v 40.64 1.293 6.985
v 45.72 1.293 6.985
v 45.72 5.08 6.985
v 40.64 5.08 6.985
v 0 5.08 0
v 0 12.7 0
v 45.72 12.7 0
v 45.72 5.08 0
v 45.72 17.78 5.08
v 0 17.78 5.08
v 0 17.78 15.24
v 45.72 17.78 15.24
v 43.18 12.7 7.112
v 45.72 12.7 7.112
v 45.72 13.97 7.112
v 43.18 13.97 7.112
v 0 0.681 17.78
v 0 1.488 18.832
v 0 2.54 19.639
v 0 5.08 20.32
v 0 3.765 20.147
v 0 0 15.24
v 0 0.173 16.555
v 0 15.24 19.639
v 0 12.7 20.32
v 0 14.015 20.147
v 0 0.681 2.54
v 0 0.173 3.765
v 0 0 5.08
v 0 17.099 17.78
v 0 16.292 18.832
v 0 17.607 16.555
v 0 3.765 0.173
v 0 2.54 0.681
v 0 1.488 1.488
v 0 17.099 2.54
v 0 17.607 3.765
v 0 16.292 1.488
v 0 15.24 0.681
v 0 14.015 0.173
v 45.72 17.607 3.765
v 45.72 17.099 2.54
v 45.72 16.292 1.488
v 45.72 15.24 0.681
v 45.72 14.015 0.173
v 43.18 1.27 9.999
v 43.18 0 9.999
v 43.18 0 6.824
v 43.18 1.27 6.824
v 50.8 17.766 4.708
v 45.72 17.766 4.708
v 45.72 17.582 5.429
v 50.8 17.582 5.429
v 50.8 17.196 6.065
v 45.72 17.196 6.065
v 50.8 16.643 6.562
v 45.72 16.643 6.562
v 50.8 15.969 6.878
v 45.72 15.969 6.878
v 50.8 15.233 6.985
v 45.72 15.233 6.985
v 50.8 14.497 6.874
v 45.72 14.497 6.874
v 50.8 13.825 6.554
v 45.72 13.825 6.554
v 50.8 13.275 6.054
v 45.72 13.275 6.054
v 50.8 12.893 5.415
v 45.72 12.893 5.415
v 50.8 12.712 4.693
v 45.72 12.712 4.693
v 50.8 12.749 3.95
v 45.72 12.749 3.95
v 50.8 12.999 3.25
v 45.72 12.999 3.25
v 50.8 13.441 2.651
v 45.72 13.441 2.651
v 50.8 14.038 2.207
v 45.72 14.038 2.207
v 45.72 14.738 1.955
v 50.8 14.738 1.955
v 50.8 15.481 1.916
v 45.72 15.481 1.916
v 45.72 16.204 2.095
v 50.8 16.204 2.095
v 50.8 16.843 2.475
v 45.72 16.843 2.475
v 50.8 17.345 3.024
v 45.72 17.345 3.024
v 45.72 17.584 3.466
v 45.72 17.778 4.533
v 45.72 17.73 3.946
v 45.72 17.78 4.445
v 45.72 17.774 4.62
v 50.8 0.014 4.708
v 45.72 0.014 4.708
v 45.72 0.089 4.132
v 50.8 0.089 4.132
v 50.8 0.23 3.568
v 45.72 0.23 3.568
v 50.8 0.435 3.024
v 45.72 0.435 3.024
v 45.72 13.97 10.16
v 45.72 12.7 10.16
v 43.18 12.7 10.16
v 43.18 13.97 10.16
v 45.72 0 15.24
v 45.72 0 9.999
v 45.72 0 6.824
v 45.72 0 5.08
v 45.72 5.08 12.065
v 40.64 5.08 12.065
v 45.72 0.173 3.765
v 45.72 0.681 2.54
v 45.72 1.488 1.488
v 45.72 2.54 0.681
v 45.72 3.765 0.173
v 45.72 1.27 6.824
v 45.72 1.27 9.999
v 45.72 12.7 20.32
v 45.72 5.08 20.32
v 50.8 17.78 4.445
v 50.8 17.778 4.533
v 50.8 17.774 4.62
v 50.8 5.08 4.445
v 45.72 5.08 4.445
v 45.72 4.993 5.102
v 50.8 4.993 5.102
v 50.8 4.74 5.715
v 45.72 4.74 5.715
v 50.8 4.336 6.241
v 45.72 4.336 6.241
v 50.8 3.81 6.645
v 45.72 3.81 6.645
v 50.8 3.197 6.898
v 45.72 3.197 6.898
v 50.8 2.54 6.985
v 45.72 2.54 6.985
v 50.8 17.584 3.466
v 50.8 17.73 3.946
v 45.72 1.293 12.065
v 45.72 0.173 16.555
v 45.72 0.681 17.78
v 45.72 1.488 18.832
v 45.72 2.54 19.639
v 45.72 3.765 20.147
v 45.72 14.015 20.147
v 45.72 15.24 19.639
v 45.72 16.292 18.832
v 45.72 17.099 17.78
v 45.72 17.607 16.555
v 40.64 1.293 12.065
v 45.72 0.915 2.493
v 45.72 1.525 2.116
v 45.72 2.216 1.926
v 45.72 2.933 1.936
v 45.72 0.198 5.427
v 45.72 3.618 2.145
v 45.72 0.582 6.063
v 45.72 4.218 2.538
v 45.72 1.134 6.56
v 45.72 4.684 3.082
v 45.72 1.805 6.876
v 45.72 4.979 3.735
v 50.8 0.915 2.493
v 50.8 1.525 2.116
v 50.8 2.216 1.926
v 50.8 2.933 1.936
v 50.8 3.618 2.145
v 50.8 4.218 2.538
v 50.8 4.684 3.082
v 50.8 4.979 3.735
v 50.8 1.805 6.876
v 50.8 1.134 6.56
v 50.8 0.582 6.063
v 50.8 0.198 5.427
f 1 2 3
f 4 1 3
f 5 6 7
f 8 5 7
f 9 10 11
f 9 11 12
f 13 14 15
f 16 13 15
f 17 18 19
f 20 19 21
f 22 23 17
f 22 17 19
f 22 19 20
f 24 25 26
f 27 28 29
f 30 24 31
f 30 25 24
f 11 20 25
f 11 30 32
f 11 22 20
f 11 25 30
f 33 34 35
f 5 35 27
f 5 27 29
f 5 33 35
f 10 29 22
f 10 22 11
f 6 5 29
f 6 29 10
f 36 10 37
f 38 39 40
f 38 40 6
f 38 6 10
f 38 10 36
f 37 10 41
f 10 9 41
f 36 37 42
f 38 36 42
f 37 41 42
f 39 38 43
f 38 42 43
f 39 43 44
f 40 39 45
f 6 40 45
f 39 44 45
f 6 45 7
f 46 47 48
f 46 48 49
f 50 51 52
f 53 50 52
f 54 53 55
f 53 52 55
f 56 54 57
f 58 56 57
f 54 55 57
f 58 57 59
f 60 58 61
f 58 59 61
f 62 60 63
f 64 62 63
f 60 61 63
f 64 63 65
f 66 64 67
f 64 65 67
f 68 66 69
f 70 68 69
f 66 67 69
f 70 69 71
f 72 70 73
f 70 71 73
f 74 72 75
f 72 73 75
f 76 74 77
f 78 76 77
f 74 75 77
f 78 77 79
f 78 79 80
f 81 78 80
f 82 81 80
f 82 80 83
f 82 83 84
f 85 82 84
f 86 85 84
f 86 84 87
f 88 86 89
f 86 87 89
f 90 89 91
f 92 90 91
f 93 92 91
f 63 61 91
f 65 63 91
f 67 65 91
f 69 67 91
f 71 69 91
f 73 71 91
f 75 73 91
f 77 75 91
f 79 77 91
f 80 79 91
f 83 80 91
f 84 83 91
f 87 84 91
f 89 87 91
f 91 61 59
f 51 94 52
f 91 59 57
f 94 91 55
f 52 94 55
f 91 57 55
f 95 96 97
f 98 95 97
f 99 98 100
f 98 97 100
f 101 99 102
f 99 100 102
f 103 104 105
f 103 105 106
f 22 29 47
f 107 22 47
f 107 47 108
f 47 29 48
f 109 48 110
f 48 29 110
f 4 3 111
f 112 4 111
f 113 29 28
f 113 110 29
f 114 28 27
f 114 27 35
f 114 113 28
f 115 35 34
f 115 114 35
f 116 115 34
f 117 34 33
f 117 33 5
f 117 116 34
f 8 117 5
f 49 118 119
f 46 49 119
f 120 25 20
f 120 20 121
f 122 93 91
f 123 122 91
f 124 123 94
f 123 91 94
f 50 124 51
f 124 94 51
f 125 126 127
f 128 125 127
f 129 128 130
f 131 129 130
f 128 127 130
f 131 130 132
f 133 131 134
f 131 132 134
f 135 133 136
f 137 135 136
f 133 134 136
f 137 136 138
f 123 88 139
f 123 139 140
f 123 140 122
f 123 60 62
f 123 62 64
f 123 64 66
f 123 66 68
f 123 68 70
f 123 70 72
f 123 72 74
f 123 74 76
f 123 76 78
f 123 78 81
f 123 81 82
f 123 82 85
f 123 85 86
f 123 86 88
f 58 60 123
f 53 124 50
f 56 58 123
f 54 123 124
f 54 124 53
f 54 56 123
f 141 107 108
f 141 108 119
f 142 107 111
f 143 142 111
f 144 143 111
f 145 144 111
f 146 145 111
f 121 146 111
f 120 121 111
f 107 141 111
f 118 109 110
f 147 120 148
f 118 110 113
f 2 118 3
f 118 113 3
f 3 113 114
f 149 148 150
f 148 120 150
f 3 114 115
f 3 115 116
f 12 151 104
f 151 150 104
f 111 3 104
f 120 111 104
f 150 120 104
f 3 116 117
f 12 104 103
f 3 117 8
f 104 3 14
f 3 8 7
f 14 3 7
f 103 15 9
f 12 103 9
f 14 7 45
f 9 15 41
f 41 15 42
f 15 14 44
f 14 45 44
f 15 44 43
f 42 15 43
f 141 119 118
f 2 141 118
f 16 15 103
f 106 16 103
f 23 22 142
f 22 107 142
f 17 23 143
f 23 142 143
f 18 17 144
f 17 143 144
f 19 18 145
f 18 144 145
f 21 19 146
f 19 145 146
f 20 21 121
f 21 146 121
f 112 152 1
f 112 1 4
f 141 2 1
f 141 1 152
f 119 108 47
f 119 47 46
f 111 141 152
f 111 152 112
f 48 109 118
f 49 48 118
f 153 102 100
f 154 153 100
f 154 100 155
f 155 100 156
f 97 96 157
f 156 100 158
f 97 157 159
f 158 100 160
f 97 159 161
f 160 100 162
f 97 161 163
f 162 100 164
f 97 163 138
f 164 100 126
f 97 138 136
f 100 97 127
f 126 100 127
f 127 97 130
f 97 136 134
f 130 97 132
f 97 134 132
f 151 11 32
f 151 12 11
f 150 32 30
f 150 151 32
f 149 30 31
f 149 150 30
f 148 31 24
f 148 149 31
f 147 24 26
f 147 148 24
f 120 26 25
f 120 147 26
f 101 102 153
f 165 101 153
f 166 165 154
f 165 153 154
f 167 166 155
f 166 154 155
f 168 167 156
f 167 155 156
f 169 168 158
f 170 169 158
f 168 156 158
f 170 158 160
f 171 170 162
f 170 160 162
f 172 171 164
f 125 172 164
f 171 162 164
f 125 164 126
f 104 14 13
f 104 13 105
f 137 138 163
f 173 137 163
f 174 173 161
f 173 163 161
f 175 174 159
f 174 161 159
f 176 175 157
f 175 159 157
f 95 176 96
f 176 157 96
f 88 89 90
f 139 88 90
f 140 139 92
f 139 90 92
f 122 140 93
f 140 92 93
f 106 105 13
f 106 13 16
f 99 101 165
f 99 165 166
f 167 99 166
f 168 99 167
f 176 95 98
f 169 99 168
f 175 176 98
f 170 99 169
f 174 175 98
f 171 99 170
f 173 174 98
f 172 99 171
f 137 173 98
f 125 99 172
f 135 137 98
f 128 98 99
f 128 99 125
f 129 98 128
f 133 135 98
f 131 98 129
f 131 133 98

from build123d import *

# Parameters (mm, degrees)
F0_W      = 45.72
F0_H      = 17.78
F1_DEPTH  = 20.32
F2_R      = 5.08
F3_W      = 3.7871776995
F3_H      = 5.08
F3_W_2    = 3.7677848834
F4_DEPTH  = 5.08
F9_W      = 1.27
F9_H      = 3.175
F9_H_2    = 3.048
F10_DEPTH = 2.54
F12_DEPTH = 5.08


# Not quite as in the source:
# - the program builds the solid bodies; features that only make, move or delete a surface that nothing else refers to are left out


with BuildPart() as f1:
    # F0 (on Top) → F1 (new body)
    with BuildSketch(Plane.XY):
        with Locations((22.86, 8.89)):
            Rectangle(F0_W, F0_H)
    extrude(amount=F1_DEPTH)

    # F2
    f2_edges = [f1.edges().sort_by_distance(p)[0] for p in [
        (22.86, 17.78, 20.32),
        (22.86, 0, 20.32),
        (22.86, 17.78, 0),
        (22.86, 0, 0),
    ]]
    fillet(f2_edges, radius=F2_R)

    # F3 (on face) → F4 (cut)
    with BuildSketch(Plane.YZ.offset(45.72)):
        with Locations((3.1864111502, 9.525)):
            Rectangle(F3_W, F3_H)
        with Locations((22.2461075583, 9.525)):
            Rectangle(F3_W_2, F3_H)
    extrude(amount=-F4_DEPTH, mode=Mode.SUBTRACT)

    # F9 (on face) → F10 (cut)
    with BuildSketch(Plane.YZ.offset(45.72)):
        with Locations((0.635, 8.4111910738)):
            Rectangle(F9_W, F9_H)
        with Locations((13.335, 8.636)):
            Rectangle(F9_W, F9_H_2)
    extrude(amount=-F10_DEPTH, mode=Mode.SUBTRACT)


with BuildPart() as f12:
    # F11 (on face) → F12 (new body)
    with BuildSketch(Plane.YZ.offset(45.72)):
        with BuildLine():
            ThreePointArc((0.4345907815, 3.0241368741), (3.2829201118, 2.0160764303), (5.08, 4.445))
            ThreePointArc((5.08, 4.445), (4.3360512242, 6.2410512242), (2.54, 6.985))
            ThreePointArc((2.54, 6.985), (0.839444466, 6.3317196071), (0.0136445126, 4.7079219494))
            ThreePointArc((0.0136445126, 4.7079219494), (0.1516760993, 3.8479190248), (0.4345907815, 3.0241368741))
        make_face()
    extrude(amount=F12_DEPTH)


with BuildPart() as f12b:
    # F11 (on face) → F12, piece 2 (new body)
    with BuildSketch(Plane.YZ.offset(45.72)):
        with BuildLine():
            ThreePointArc((17.7663554874, 4.7079219494), (17.6283239007, 3.8479190248), (17.3454092185, 3.0241368741))
            ThreePointArc((17.3454092185, 3.0241368741), (17.6689235697, 3.7020798882), (17.78, 4.445))
            ThreePointArc((17.78, 4.445), (17.7765865782, 4.5766378785), (17.7663554874, 4.7079219494))
        make_face()
        with BuildLine():
            ThreePointArc((17.7663554874, 4.7079219494), (12.7758380496, 5.0610404876), (17.3454092185, 3.0241368741))
            ThreePointArc((17.3454092185, 3.0241368741), (17.6283239007, 3.8479190248), (17.7663554874, 4.7079219494))
        make_face()
    extrude(amount=F12_DEPTH)


solid = Compound([f1.part, f12.part, f12b.part])
